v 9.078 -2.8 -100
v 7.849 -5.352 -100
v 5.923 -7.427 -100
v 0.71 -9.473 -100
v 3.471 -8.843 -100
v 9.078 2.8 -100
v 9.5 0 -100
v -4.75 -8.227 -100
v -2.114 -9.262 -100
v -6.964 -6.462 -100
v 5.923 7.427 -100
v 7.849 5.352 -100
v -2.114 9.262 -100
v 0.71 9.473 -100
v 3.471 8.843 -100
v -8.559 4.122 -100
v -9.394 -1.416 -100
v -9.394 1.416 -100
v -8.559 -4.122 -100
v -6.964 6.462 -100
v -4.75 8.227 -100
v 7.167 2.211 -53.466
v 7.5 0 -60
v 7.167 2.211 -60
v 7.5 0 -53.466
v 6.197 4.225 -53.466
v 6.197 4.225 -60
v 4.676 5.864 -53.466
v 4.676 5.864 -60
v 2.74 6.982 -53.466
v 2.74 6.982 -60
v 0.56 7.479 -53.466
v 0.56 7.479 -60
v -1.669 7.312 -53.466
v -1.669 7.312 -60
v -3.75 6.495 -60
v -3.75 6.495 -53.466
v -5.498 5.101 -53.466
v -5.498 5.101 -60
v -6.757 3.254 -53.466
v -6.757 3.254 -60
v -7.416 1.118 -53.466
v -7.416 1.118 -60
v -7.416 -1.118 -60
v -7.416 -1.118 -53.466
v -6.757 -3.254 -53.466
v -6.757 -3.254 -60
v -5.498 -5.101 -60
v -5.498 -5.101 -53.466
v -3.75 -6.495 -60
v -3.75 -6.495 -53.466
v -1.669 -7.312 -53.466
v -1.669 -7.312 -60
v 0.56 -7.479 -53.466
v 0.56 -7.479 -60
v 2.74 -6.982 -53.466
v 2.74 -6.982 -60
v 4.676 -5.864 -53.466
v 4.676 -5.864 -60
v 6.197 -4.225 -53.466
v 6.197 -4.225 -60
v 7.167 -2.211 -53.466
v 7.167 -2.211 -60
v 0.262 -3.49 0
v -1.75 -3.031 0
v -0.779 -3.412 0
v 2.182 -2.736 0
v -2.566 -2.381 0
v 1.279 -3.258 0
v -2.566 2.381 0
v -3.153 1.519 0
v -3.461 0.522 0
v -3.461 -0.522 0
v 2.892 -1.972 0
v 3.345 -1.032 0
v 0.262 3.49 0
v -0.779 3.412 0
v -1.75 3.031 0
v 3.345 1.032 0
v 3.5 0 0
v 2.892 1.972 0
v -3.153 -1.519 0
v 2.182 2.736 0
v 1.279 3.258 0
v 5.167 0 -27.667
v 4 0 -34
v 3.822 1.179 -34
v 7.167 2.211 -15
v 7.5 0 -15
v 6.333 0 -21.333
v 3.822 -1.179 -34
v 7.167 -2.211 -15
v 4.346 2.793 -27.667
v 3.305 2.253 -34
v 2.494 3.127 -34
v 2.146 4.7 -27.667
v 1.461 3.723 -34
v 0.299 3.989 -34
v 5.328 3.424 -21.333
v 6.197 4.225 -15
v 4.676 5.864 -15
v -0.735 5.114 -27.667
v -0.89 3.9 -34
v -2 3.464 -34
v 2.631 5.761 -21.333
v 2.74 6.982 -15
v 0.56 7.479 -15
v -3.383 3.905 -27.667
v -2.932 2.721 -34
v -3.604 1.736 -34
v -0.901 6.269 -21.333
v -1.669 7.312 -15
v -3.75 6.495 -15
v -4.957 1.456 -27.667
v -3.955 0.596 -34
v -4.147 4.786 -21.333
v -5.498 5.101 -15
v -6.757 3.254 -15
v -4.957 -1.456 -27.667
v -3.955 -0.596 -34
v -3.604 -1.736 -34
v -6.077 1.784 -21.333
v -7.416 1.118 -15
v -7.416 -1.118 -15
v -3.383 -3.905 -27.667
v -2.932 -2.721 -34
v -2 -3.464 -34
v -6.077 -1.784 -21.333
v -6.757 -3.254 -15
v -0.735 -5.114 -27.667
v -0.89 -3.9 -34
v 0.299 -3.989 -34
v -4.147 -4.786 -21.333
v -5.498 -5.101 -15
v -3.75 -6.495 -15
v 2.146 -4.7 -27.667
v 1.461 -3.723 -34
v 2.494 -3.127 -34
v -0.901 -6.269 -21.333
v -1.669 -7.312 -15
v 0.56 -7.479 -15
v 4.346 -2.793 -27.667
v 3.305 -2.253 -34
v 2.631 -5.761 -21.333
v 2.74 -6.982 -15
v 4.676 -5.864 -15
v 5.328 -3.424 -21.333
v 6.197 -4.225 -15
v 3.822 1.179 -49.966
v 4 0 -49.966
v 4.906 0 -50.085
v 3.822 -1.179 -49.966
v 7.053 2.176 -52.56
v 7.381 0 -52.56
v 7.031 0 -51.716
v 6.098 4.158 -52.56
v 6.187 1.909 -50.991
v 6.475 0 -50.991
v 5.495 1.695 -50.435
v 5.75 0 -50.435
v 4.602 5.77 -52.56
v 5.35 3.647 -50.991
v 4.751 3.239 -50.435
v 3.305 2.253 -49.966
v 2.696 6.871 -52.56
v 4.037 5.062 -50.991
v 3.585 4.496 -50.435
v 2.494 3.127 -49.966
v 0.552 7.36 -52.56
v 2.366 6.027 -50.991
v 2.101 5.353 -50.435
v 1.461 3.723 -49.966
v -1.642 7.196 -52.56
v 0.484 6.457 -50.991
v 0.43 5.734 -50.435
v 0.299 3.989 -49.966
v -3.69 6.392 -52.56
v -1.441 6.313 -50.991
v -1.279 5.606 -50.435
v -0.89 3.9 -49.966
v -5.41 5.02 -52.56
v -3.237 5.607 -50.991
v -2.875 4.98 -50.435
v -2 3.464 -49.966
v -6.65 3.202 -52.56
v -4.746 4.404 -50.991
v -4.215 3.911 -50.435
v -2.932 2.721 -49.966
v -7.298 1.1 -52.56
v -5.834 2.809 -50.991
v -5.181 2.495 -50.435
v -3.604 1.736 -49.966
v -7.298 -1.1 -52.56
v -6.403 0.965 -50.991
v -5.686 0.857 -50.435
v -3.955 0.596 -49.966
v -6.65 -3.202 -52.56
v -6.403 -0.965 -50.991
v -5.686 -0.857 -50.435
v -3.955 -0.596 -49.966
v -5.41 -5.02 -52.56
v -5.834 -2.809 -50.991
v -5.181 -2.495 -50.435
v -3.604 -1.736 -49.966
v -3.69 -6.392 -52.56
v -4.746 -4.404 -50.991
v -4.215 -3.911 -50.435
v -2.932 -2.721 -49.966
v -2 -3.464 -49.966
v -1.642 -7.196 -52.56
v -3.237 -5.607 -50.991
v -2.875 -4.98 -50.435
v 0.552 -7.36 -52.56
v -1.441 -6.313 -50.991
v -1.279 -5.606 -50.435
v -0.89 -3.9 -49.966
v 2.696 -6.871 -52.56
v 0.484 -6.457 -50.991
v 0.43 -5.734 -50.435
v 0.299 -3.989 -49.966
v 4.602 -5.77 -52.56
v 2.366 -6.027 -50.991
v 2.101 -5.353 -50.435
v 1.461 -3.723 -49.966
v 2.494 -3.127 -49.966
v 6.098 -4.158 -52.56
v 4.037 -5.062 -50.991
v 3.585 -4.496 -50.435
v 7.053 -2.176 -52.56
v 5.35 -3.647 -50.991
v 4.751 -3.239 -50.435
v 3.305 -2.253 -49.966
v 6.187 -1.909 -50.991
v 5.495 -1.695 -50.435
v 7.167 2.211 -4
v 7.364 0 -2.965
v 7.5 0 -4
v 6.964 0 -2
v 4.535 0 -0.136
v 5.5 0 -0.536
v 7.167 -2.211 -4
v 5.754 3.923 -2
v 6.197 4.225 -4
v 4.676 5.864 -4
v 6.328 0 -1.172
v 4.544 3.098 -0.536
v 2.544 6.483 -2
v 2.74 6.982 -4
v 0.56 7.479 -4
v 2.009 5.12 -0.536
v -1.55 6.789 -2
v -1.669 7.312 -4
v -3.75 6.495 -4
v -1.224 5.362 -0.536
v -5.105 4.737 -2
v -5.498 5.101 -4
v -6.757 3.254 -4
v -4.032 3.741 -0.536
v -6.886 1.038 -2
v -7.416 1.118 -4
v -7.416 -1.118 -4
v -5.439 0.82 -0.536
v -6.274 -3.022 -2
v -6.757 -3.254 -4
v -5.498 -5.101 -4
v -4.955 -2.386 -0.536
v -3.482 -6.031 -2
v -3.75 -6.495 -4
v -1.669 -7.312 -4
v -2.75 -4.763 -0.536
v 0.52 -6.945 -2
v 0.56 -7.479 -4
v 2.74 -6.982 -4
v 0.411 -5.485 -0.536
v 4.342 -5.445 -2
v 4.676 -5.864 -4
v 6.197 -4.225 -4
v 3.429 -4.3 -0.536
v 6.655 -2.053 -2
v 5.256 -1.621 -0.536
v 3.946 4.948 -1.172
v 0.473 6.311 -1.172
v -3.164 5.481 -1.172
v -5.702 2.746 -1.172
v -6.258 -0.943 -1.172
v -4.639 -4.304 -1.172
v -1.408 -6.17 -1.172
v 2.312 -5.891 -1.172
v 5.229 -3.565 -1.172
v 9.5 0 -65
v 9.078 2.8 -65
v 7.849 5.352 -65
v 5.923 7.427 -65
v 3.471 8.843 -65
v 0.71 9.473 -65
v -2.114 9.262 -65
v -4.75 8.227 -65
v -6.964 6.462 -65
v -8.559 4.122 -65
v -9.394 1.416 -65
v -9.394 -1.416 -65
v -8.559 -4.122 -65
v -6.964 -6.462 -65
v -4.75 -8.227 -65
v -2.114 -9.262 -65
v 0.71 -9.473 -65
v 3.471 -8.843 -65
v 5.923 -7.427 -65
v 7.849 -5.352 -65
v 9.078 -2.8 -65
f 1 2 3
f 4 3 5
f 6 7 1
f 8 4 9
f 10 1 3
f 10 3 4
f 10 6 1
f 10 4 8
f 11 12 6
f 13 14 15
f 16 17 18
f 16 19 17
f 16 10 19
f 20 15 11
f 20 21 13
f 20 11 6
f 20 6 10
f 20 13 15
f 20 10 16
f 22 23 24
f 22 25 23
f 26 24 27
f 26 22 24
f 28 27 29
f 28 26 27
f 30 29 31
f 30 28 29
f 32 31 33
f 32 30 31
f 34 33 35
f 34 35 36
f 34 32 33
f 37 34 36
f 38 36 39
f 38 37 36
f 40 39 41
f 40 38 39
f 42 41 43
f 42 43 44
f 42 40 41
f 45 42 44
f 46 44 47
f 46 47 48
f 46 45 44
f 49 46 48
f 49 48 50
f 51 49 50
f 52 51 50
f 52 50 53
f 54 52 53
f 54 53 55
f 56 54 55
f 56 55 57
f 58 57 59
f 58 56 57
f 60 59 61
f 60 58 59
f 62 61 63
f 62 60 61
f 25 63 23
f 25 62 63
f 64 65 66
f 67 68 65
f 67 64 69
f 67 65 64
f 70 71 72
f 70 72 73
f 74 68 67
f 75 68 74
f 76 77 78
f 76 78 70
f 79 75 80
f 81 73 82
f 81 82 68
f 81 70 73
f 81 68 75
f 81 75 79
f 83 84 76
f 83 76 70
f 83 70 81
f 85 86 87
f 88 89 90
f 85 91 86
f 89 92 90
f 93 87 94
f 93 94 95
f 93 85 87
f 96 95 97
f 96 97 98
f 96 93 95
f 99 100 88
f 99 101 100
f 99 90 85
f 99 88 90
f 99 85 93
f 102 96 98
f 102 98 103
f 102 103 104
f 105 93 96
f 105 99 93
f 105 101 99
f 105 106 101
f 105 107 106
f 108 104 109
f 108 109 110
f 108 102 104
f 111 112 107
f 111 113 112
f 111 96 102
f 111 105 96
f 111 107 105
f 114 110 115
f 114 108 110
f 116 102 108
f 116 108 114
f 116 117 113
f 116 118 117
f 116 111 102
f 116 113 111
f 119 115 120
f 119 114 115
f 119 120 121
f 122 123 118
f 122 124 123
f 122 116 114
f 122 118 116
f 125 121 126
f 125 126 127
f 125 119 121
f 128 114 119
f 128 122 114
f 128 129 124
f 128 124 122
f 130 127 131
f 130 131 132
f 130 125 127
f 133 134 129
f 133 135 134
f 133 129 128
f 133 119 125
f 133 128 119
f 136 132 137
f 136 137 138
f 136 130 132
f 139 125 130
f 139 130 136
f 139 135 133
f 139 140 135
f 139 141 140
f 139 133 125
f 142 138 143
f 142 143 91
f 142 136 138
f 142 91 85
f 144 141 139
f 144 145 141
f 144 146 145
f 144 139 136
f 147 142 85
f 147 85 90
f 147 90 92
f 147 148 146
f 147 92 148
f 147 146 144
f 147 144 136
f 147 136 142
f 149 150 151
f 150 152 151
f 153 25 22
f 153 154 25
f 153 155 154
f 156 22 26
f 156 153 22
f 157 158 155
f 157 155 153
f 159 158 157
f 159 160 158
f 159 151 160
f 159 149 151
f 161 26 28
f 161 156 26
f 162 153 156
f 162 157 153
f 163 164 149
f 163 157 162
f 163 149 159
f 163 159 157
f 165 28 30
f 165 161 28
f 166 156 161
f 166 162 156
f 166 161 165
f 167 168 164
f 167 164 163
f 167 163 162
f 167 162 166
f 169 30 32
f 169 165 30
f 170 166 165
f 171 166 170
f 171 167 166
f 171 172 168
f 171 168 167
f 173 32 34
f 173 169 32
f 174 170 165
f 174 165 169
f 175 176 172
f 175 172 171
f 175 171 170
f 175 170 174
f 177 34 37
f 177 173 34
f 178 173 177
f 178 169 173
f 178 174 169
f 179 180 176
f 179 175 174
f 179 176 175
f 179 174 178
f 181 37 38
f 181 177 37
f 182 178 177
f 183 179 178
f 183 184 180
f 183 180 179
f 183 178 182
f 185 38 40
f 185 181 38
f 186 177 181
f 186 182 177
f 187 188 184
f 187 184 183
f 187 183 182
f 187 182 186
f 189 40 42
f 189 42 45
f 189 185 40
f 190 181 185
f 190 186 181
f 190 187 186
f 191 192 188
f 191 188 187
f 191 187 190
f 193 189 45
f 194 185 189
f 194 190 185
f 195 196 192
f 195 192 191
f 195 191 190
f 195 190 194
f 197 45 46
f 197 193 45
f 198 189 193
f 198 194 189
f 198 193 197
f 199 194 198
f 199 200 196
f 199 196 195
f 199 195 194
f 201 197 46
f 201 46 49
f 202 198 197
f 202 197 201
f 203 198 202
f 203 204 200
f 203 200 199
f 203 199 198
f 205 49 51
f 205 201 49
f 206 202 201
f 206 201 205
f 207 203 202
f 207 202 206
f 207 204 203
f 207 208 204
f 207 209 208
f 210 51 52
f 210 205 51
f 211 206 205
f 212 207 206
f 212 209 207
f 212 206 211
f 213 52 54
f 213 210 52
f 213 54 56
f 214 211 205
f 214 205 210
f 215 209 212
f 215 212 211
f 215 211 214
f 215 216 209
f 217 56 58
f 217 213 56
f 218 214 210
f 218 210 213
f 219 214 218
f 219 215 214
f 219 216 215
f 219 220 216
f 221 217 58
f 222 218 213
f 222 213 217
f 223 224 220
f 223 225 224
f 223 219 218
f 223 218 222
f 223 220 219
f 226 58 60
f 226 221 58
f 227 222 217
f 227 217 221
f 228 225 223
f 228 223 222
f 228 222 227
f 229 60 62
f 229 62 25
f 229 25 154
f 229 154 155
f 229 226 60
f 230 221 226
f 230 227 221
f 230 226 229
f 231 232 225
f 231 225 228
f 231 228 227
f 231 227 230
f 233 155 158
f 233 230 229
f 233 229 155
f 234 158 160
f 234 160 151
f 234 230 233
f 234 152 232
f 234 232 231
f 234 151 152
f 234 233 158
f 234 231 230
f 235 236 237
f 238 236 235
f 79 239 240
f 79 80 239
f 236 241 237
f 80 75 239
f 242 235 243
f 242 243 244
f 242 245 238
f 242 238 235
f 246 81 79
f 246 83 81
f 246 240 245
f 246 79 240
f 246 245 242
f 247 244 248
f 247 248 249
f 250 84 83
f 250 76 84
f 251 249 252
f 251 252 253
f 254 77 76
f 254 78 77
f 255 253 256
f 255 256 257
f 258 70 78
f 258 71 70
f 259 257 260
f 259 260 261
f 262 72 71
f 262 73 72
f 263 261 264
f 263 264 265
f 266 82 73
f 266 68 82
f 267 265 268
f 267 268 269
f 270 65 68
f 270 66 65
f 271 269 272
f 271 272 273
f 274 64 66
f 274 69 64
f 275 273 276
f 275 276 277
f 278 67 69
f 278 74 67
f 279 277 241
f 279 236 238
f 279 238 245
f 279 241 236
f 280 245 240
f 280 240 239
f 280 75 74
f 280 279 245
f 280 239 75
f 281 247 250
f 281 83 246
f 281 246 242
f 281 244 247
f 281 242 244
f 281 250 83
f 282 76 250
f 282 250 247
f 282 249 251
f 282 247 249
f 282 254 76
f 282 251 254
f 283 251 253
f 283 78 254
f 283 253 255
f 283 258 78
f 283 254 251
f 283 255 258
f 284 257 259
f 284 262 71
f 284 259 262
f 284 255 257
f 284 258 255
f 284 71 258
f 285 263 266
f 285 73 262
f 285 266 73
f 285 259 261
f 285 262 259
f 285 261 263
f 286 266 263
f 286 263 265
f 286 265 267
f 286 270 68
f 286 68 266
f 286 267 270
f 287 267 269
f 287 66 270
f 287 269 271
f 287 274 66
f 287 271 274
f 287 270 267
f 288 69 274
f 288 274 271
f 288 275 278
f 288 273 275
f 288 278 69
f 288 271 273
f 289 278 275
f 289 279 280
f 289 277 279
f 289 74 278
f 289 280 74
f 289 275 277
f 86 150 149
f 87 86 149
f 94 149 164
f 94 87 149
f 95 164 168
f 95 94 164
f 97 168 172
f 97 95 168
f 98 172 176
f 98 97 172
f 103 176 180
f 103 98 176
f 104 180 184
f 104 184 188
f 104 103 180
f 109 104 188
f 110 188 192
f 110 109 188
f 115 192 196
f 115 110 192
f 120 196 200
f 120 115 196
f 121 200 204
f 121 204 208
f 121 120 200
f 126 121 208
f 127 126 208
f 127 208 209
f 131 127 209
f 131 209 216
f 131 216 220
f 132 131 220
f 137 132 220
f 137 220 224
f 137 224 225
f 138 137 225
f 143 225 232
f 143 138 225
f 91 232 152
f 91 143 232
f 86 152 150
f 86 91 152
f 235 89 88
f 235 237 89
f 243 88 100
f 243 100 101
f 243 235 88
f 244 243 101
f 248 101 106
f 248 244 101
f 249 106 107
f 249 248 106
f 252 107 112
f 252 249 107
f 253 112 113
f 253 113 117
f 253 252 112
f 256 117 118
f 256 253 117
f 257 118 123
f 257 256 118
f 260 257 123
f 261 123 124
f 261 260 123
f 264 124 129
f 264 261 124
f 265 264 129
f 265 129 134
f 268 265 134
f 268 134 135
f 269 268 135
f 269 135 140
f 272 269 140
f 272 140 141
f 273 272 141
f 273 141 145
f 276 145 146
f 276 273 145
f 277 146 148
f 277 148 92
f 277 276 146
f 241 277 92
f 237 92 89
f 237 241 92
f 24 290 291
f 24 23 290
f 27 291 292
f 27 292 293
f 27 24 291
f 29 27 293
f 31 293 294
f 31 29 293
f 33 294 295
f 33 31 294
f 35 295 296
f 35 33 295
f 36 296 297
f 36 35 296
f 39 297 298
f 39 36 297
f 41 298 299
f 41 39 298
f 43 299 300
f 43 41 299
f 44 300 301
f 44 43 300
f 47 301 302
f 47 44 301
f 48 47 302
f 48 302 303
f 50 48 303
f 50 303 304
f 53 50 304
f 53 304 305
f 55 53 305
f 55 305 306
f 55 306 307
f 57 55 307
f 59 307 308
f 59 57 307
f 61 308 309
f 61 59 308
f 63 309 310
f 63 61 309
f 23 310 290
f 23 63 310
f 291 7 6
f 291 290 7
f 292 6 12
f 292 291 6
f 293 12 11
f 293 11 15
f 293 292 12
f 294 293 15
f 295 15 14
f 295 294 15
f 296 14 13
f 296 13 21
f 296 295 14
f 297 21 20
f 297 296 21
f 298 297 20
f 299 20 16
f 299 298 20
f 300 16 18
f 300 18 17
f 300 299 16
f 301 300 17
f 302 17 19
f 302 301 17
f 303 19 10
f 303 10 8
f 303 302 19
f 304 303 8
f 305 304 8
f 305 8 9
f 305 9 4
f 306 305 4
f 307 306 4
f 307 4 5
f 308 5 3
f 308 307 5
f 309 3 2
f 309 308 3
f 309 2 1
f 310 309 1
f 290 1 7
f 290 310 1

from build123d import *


with BuildPart() as f1:
    # F0 (on Front) → F1 (revolve)
    with BuildSketch(Plane.XZ):
        with BuildLine():
            Line((7.5, -15), (7.5, -4))
            ThreePointArc((7.5, -4), (6.328427, -1.171573), (3.5, 0))
            Line((3.5, 0), (0, 0))
            Line((0, 0), (0, -100))
            Line((0, -100), (9.5, -100))
            Line((9.5, -100), (9.5, -65))
            Line((9.5, -65), (7.5, -60))
            Line((7.5, -60), (7.5, -53.465673))
            ThreePointArc((7.5, -53.465673), (6.474874, -50.990799), (4, -49.965673))
            Line((4, -49.965673), (4, -34))
            Line((4, -34), (7.5, -15))
        make_face()
    revolve(axis=Axis((0, 0, -50), (0, 0, 1)))


solid = f1.part
